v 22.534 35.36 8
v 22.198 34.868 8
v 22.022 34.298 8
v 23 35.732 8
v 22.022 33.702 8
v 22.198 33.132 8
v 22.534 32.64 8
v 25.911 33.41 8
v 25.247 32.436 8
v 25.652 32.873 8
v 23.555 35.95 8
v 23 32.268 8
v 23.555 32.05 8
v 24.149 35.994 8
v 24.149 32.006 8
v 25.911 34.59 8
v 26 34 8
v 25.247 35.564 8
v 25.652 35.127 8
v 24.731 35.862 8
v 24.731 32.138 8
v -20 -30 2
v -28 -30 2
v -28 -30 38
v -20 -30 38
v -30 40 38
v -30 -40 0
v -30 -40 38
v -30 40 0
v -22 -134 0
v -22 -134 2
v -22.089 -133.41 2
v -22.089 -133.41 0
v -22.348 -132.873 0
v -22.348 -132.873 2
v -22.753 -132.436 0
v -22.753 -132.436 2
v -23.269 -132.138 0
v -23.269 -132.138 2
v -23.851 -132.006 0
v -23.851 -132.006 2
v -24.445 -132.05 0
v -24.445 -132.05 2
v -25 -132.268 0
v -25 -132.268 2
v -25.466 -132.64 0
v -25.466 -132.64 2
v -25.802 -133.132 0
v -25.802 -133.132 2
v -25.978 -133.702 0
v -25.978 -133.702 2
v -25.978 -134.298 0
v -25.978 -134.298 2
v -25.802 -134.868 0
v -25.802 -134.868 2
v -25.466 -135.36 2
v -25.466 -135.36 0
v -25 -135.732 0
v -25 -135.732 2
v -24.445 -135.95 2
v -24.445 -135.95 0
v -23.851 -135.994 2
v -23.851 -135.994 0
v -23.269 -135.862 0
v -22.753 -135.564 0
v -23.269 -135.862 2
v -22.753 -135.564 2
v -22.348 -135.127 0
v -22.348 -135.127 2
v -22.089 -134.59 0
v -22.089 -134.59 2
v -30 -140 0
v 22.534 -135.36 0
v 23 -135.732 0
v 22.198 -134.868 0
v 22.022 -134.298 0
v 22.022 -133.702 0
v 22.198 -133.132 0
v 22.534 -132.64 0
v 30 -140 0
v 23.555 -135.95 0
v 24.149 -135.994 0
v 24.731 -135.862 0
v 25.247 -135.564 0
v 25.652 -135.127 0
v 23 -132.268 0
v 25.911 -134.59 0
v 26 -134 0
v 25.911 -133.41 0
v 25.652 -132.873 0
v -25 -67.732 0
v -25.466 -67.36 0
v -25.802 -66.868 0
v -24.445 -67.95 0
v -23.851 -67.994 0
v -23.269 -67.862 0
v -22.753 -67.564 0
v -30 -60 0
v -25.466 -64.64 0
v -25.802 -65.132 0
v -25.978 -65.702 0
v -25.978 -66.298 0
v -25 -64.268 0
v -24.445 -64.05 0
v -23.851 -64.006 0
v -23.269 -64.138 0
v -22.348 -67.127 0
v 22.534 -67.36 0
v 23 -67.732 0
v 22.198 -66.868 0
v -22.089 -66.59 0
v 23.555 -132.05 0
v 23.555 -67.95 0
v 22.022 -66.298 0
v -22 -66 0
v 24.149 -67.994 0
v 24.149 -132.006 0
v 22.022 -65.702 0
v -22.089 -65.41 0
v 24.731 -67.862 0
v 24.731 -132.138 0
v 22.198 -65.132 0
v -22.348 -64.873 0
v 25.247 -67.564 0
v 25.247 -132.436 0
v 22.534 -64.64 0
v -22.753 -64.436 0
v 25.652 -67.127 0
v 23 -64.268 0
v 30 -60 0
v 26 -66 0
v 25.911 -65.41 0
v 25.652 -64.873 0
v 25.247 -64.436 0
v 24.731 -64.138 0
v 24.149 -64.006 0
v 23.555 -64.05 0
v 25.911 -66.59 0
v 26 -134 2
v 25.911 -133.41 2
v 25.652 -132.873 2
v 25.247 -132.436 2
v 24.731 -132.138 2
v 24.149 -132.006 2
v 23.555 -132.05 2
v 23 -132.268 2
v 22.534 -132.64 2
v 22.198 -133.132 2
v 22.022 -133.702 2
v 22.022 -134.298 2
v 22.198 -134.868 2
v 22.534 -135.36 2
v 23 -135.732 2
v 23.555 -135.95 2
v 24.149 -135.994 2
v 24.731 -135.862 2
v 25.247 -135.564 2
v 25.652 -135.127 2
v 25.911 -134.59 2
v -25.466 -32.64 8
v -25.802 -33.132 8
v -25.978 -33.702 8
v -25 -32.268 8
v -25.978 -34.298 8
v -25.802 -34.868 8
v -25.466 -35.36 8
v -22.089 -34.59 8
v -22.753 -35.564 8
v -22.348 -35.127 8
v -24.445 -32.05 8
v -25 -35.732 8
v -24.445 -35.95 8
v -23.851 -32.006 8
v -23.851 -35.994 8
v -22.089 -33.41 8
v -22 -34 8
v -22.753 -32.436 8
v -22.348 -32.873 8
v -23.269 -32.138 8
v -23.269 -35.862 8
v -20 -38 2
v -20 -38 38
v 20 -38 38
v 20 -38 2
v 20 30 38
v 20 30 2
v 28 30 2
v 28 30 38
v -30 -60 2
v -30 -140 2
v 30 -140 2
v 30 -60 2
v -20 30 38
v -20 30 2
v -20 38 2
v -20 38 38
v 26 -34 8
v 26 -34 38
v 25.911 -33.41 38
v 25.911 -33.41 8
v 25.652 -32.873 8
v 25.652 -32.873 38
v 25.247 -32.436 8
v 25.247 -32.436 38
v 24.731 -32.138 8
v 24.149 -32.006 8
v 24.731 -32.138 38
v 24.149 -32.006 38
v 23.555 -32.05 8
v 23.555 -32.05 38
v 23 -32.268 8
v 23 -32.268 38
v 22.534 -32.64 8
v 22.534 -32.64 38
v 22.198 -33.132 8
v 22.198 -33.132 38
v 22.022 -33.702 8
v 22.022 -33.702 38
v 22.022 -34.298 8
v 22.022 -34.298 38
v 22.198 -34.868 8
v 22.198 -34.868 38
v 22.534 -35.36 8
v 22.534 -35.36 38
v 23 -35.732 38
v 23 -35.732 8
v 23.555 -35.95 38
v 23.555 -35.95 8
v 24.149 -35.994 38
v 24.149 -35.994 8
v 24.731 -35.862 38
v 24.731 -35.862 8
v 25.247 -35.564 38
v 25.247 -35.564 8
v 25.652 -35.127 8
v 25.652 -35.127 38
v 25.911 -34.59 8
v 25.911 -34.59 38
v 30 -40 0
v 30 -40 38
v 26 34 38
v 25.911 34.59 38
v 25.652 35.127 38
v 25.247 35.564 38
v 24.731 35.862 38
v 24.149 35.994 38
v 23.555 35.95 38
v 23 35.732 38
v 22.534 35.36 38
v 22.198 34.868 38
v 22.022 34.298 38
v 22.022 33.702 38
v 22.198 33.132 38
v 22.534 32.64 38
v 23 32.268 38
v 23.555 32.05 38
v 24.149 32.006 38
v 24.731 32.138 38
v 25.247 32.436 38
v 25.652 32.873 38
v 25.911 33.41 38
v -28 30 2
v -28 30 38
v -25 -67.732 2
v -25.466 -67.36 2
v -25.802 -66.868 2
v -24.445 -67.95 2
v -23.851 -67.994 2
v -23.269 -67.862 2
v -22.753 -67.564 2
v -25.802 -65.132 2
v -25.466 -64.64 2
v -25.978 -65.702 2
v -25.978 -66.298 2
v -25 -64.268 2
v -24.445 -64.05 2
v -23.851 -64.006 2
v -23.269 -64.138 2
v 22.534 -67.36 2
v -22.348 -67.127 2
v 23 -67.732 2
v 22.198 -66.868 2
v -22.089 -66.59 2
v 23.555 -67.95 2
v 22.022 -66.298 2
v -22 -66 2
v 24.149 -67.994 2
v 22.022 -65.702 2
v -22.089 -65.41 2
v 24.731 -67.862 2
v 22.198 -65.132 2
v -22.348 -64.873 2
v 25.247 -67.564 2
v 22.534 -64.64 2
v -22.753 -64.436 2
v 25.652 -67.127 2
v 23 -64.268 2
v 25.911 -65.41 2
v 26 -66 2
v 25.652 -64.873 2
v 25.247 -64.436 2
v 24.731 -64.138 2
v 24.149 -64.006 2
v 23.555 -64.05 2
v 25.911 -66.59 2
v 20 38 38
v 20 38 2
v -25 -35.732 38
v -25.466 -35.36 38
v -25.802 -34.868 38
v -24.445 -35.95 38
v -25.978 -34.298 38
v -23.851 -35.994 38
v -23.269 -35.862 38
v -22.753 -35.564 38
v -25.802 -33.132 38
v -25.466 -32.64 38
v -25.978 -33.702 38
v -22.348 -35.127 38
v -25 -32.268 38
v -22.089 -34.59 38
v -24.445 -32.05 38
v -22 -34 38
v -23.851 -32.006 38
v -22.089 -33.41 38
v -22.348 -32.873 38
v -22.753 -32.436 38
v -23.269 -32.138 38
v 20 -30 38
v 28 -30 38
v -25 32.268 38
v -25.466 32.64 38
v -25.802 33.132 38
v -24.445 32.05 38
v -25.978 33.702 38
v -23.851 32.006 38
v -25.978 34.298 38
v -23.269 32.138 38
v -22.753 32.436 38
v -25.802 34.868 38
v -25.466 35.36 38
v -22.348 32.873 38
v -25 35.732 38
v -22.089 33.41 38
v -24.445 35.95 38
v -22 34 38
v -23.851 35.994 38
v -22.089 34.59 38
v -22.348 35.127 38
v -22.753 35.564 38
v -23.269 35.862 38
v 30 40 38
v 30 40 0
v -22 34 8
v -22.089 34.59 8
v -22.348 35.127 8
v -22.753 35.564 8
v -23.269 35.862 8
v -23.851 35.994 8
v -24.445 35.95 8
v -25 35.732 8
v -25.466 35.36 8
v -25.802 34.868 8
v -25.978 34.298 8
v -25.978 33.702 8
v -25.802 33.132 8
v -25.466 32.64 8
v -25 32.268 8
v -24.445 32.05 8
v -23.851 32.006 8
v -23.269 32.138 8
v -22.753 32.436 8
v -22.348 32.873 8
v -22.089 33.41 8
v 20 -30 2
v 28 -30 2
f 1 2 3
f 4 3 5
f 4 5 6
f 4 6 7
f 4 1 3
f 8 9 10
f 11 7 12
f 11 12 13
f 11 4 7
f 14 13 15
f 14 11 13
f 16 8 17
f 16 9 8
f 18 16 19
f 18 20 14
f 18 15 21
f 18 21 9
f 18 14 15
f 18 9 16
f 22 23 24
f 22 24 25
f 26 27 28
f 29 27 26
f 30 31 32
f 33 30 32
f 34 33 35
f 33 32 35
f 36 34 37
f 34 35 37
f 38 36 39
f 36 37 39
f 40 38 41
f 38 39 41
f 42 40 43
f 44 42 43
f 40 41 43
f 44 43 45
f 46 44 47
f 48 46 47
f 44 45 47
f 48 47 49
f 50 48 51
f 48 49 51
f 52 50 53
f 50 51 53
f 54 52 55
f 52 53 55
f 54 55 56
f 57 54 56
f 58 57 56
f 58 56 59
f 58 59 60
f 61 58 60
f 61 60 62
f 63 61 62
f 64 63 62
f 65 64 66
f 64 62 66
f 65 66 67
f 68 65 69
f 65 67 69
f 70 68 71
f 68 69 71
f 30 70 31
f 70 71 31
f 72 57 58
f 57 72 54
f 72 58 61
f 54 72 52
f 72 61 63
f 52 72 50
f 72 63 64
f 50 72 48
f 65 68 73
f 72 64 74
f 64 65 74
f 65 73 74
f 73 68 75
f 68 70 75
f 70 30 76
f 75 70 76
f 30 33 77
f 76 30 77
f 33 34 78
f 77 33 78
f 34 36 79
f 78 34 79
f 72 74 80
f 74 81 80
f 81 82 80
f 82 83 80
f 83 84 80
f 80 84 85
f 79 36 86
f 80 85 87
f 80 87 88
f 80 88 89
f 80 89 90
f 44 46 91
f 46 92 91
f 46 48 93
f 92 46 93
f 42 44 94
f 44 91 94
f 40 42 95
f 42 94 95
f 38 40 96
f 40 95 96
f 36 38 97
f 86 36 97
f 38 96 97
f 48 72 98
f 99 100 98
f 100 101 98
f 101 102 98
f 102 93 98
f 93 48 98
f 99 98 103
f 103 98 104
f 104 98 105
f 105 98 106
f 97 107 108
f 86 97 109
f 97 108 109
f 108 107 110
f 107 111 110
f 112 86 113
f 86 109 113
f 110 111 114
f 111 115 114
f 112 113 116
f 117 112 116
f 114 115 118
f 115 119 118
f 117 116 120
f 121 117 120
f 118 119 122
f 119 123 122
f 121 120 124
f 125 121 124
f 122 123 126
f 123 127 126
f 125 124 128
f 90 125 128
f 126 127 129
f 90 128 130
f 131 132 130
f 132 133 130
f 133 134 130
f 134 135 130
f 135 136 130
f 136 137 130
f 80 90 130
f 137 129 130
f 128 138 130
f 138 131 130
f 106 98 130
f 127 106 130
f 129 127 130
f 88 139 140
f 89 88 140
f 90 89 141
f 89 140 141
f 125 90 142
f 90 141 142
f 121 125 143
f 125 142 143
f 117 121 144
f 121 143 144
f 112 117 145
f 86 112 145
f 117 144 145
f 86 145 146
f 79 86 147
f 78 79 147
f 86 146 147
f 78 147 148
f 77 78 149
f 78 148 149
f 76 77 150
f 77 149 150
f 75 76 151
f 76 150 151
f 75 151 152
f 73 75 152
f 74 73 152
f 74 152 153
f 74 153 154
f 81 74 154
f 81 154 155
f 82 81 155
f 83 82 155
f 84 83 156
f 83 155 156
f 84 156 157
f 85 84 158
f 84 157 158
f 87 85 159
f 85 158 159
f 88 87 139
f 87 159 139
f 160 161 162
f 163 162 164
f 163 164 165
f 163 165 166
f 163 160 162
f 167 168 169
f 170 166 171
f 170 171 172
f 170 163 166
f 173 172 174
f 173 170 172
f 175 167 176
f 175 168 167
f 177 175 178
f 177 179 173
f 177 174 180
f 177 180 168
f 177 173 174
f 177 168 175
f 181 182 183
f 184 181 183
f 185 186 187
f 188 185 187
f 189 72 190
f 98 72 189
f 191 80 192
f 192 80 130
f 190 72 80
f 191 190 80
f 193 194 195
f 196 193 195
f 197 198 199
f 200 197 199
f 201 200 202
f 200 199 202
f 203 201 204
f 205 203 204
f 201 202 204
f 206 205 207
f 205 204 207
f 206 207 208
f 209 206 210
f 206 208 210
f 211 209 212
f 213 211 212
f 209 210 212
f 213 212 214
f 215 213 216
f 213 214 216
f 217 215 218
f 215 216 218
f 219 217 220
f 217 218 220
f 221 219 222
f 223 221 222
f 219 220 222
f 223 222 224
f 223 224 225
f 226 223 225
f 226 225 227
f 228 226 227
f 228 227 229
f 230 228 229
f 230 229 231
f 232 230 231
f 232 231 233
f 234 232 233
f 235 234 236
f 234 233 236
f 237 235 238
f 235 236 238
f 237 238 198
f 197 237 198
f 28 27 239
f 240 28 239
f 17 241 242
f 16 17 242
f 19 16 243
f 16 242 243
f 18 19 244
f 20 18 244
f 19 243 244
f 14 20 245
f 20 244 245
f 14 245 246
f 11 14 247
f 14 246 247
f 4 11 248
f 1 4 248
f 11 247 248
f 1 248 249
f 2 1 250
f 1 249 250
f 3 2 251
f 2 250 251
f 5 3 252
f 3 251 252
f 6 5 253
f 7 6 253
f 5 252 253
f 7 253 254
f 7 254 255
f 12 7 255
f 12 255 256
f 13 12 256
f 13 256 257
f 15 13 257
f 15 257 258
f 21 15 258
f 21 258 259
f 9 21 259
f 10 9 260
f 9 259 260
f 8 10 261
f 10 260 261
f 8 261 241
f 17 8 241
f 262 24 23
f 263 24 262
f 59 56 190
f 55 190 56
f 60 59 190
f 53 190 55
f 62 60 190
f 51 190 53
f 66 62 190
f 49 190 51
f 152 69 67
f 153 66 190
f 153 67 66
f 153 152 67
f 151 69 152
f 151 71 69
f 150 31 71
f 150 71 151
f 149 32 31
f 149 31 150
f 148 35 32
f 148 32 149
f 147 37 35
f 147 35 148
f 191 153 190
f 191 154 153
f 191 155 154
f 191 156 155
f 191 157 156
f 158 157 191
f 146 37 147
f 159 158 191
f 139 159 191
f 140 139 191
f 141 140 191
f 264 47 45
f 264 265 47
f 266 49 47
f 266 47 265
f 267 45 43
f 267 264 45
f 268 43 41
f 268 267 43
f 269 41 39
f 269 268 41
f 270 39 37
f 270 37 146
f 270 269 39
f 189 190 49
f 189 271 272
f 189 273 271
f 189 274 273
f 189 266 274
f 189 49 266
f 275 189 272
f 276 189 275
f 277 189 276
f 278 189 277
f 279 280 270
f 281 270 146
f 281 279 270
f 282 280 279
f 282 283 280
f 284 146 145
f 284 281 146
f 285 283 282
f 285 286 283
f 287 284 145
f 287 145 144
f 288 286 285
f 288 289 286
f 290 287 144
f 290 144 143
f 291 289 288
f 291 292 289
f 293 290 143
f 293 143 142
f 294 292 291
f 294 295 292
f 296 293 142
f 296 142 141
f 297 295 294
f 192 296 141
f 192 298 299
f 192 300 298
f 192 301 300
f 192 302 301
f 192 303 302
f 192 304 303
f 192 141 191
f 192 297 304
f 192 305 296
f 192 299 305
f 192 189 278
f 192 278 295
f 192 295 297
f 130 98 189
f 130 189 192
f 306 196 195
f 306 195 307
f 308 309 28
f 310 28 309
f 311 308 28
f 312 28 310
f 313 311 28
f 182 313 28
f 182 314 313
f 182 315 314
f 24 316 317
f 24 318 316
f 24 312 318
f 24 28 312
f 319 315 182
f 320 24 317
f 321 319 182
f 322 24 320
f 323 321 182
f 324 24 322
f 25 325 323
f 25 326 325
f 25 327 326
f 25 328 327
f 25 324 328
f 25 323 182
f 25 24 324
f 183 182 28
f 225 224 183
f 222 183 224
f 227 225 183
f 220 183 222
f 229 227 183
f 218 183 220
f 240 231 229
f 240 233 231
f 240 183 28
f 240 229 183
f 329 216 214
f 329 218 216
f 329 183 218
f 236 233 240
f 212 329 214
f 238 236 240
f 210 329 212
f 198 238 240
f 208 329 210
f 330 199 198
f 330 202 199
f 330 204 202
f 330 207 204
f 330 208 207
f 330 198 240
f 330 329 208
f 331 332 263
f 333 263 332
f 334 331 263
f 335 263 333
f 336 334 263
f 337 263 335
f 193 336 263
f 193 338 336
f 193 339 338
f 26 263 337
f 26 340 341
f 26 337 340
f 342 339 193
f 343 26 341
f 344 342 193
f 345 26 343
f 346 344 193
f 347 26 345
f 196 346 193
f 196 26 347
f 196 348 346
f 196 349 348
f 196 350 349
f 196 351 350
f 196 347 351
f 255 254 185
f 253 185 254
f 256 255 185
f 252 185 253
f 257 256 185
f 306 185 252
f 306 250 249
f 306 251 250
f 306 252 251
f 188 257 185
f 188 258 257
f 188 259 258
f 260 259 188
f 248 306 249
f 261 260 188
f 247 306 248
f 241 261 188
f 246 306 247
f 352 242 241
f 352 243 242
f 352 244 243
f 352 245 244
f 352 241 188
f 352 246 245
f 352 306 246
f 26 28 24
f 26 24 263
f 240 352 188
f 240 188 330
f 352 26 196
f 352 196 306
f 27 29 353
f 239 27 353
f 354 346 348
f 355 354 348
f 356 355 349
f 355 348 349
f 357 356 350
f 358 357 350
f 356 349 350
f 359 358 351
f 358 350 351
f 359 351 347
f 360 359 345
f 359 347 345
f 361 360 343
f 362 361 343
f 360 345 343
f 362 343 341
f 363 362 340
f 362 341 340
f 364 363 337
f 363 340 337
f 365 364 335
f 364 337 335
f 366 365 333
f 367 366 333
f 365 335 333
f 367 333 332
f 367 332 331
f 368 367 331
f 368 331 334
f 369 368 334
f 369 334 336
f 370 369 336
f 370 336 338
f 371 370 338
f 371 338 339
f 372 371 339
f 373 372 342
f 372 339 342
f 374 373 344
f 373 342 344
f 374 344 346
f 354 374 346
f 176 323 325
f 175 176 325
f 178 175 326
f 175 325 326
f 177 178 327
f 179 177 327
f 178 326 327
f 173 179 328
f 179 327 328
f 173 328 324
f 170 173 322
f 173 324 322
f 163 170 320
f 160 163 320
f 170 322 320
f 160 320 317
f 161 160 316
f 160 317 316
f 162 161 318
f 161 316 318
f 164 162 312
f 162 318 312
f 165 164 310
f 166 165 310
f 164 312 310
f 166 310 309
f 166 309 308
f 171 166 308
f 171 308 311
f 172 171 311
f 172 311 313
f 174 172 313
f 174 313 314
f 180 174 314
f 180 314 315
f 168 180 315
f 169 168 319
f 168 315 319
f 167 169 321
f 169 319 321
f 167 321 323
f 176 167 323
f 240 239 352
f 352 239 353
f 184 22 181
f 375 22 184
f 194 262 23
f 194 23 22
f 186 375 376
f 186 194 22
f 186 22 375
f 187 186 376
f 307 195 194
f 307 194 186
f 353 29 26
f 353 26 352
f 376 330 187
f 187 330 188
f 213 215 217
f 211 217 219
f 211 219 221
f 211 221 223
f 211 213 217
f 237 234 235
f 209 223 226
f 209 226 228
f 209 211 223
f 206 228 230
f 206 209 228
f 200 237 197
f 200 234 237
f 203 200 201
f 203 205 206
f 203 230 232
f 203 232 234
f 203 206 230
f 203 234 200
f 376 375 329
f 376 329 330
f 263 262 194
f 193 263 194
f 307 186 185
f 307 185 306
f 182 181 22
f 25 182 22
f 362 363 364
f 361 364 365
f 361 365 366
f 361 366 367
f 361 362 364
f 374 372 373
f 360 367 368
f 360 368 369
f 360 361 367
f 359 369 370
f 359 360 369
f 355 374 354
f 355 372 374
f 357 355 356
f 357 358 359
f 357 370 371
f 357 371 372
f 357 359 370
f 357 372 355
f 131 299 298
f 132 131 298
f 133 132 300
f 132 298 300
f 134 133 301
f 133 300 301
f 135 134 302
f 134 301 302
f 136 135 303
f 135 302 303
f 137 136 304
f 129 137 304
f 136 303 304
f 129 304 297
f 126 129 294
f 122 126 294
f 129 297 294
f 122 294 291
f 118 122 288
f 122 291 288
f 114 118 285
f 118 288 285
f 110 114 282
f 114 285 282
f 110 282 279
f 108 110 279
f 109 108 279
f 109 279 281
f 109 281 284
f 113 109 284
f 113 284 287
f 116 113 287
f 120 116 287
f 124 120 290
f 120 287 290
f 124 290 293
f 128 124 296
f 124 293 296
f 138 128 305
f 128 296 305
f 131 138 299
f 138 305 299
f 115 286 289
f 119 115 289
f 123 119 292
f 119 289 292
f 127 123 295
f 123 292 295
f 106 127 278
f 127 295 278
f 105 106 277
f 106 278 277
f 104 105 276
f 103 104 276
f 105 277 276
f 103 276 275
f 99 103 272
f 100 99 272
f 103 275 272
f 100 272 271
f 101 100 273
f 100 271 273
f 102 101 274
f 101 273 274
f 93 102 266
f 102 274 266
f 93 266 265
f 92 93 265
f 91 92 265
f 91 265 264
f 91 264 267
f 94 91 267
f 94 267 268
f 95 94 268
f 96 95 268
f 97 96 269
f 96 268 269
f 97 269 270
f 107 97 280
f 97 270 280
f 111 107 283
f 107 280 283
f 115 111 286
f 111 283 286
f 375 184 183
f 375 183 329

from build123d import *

# Parameters (mm, degrees)
F3_W      = 60
F3_H      = 80
F4_DEPTH  = 38
F5_W      = 56
F5_H      = 76
F6_DEPTH  = 36
F7_W      = 8
F7_H      = 8
F8_DEPTH  = 36
F9_R      = 2
F10_DEPTH = 30
F11_W     = 60
F11_H     = 80
F12_DEPTH = 2
F13_R     = 2
F14_DEPTH = 2


with BuildPart() as f4:
    # F3 (on Top) → F4 (new body)
    with BuildSketch(Plane.XY):
        Rectangle(F3_W, F3_H)
    extrude(amount=F4_DEPTH)

    # F5 (on face) → F6 (cut)
    with BuildSketch(Plane.XY.offset(38)):
        Rectangle(F5_W, F5_H)
    extrude(amount=-F6_DEPTH, mode=Mode.SUBTRACT)

    # F7 (on face) → F8 (join)
    with BuildSketch(Plane.XY.offset(2)):
        with Locations((-24, 34)):
            Rectangle(F7_W, F7_H)
        with Locations((24, 34)):
            Rectangle(F7_W, F7_H)
        with Locations((24, -34)):
            Rectangle(F7_W, F7_H)
        with Locations((-24, -34)):
            Rectangle(F7_W, F7_H)
    extrude(amount=F8_DEPTH)

    # F9 (on face) → F10 (cut)
    with BuildSketch(Plane.XY.offset(38)):
        with Locations((-24, 34)):
            Circle(F9_R)
        with Locations((24, 34)):
            Circle(F9_R)
        with Locations((24, -34)):
            Circle(F9_R)
        with Locations((-24, -34)):
            Circle(F9_R)
    extrude(amount=-F10_DEPTH, mode=Mode.SUBTRACT)


with BuildPart() as f12:
    # F11 (on Top) → F12 (new body)
    with BuildSketch(Plane.XY):
        with Locations((0, -100)):
            Rectangle(F11_W, F11_H)
    extrude(amount=F12_DEPTH)

    # F13 (on face) → F14 (cut)
    with BuildSketch(Plane.XY.offset(2)):
        with Locations((-24, -134)):
            Circle(F13_R)
        with Locations((-24, -66)):
            Circle(F13_R)
        with Locations((24, -66)):
            Circle(F13_R)
        with Locations((24, -134)):
            Circle(F13_R)
    extrude(amount=-F14_DEPTH, mode=Mode.SUBTRACT)


solid = Compound([f4.part, f12.part])
